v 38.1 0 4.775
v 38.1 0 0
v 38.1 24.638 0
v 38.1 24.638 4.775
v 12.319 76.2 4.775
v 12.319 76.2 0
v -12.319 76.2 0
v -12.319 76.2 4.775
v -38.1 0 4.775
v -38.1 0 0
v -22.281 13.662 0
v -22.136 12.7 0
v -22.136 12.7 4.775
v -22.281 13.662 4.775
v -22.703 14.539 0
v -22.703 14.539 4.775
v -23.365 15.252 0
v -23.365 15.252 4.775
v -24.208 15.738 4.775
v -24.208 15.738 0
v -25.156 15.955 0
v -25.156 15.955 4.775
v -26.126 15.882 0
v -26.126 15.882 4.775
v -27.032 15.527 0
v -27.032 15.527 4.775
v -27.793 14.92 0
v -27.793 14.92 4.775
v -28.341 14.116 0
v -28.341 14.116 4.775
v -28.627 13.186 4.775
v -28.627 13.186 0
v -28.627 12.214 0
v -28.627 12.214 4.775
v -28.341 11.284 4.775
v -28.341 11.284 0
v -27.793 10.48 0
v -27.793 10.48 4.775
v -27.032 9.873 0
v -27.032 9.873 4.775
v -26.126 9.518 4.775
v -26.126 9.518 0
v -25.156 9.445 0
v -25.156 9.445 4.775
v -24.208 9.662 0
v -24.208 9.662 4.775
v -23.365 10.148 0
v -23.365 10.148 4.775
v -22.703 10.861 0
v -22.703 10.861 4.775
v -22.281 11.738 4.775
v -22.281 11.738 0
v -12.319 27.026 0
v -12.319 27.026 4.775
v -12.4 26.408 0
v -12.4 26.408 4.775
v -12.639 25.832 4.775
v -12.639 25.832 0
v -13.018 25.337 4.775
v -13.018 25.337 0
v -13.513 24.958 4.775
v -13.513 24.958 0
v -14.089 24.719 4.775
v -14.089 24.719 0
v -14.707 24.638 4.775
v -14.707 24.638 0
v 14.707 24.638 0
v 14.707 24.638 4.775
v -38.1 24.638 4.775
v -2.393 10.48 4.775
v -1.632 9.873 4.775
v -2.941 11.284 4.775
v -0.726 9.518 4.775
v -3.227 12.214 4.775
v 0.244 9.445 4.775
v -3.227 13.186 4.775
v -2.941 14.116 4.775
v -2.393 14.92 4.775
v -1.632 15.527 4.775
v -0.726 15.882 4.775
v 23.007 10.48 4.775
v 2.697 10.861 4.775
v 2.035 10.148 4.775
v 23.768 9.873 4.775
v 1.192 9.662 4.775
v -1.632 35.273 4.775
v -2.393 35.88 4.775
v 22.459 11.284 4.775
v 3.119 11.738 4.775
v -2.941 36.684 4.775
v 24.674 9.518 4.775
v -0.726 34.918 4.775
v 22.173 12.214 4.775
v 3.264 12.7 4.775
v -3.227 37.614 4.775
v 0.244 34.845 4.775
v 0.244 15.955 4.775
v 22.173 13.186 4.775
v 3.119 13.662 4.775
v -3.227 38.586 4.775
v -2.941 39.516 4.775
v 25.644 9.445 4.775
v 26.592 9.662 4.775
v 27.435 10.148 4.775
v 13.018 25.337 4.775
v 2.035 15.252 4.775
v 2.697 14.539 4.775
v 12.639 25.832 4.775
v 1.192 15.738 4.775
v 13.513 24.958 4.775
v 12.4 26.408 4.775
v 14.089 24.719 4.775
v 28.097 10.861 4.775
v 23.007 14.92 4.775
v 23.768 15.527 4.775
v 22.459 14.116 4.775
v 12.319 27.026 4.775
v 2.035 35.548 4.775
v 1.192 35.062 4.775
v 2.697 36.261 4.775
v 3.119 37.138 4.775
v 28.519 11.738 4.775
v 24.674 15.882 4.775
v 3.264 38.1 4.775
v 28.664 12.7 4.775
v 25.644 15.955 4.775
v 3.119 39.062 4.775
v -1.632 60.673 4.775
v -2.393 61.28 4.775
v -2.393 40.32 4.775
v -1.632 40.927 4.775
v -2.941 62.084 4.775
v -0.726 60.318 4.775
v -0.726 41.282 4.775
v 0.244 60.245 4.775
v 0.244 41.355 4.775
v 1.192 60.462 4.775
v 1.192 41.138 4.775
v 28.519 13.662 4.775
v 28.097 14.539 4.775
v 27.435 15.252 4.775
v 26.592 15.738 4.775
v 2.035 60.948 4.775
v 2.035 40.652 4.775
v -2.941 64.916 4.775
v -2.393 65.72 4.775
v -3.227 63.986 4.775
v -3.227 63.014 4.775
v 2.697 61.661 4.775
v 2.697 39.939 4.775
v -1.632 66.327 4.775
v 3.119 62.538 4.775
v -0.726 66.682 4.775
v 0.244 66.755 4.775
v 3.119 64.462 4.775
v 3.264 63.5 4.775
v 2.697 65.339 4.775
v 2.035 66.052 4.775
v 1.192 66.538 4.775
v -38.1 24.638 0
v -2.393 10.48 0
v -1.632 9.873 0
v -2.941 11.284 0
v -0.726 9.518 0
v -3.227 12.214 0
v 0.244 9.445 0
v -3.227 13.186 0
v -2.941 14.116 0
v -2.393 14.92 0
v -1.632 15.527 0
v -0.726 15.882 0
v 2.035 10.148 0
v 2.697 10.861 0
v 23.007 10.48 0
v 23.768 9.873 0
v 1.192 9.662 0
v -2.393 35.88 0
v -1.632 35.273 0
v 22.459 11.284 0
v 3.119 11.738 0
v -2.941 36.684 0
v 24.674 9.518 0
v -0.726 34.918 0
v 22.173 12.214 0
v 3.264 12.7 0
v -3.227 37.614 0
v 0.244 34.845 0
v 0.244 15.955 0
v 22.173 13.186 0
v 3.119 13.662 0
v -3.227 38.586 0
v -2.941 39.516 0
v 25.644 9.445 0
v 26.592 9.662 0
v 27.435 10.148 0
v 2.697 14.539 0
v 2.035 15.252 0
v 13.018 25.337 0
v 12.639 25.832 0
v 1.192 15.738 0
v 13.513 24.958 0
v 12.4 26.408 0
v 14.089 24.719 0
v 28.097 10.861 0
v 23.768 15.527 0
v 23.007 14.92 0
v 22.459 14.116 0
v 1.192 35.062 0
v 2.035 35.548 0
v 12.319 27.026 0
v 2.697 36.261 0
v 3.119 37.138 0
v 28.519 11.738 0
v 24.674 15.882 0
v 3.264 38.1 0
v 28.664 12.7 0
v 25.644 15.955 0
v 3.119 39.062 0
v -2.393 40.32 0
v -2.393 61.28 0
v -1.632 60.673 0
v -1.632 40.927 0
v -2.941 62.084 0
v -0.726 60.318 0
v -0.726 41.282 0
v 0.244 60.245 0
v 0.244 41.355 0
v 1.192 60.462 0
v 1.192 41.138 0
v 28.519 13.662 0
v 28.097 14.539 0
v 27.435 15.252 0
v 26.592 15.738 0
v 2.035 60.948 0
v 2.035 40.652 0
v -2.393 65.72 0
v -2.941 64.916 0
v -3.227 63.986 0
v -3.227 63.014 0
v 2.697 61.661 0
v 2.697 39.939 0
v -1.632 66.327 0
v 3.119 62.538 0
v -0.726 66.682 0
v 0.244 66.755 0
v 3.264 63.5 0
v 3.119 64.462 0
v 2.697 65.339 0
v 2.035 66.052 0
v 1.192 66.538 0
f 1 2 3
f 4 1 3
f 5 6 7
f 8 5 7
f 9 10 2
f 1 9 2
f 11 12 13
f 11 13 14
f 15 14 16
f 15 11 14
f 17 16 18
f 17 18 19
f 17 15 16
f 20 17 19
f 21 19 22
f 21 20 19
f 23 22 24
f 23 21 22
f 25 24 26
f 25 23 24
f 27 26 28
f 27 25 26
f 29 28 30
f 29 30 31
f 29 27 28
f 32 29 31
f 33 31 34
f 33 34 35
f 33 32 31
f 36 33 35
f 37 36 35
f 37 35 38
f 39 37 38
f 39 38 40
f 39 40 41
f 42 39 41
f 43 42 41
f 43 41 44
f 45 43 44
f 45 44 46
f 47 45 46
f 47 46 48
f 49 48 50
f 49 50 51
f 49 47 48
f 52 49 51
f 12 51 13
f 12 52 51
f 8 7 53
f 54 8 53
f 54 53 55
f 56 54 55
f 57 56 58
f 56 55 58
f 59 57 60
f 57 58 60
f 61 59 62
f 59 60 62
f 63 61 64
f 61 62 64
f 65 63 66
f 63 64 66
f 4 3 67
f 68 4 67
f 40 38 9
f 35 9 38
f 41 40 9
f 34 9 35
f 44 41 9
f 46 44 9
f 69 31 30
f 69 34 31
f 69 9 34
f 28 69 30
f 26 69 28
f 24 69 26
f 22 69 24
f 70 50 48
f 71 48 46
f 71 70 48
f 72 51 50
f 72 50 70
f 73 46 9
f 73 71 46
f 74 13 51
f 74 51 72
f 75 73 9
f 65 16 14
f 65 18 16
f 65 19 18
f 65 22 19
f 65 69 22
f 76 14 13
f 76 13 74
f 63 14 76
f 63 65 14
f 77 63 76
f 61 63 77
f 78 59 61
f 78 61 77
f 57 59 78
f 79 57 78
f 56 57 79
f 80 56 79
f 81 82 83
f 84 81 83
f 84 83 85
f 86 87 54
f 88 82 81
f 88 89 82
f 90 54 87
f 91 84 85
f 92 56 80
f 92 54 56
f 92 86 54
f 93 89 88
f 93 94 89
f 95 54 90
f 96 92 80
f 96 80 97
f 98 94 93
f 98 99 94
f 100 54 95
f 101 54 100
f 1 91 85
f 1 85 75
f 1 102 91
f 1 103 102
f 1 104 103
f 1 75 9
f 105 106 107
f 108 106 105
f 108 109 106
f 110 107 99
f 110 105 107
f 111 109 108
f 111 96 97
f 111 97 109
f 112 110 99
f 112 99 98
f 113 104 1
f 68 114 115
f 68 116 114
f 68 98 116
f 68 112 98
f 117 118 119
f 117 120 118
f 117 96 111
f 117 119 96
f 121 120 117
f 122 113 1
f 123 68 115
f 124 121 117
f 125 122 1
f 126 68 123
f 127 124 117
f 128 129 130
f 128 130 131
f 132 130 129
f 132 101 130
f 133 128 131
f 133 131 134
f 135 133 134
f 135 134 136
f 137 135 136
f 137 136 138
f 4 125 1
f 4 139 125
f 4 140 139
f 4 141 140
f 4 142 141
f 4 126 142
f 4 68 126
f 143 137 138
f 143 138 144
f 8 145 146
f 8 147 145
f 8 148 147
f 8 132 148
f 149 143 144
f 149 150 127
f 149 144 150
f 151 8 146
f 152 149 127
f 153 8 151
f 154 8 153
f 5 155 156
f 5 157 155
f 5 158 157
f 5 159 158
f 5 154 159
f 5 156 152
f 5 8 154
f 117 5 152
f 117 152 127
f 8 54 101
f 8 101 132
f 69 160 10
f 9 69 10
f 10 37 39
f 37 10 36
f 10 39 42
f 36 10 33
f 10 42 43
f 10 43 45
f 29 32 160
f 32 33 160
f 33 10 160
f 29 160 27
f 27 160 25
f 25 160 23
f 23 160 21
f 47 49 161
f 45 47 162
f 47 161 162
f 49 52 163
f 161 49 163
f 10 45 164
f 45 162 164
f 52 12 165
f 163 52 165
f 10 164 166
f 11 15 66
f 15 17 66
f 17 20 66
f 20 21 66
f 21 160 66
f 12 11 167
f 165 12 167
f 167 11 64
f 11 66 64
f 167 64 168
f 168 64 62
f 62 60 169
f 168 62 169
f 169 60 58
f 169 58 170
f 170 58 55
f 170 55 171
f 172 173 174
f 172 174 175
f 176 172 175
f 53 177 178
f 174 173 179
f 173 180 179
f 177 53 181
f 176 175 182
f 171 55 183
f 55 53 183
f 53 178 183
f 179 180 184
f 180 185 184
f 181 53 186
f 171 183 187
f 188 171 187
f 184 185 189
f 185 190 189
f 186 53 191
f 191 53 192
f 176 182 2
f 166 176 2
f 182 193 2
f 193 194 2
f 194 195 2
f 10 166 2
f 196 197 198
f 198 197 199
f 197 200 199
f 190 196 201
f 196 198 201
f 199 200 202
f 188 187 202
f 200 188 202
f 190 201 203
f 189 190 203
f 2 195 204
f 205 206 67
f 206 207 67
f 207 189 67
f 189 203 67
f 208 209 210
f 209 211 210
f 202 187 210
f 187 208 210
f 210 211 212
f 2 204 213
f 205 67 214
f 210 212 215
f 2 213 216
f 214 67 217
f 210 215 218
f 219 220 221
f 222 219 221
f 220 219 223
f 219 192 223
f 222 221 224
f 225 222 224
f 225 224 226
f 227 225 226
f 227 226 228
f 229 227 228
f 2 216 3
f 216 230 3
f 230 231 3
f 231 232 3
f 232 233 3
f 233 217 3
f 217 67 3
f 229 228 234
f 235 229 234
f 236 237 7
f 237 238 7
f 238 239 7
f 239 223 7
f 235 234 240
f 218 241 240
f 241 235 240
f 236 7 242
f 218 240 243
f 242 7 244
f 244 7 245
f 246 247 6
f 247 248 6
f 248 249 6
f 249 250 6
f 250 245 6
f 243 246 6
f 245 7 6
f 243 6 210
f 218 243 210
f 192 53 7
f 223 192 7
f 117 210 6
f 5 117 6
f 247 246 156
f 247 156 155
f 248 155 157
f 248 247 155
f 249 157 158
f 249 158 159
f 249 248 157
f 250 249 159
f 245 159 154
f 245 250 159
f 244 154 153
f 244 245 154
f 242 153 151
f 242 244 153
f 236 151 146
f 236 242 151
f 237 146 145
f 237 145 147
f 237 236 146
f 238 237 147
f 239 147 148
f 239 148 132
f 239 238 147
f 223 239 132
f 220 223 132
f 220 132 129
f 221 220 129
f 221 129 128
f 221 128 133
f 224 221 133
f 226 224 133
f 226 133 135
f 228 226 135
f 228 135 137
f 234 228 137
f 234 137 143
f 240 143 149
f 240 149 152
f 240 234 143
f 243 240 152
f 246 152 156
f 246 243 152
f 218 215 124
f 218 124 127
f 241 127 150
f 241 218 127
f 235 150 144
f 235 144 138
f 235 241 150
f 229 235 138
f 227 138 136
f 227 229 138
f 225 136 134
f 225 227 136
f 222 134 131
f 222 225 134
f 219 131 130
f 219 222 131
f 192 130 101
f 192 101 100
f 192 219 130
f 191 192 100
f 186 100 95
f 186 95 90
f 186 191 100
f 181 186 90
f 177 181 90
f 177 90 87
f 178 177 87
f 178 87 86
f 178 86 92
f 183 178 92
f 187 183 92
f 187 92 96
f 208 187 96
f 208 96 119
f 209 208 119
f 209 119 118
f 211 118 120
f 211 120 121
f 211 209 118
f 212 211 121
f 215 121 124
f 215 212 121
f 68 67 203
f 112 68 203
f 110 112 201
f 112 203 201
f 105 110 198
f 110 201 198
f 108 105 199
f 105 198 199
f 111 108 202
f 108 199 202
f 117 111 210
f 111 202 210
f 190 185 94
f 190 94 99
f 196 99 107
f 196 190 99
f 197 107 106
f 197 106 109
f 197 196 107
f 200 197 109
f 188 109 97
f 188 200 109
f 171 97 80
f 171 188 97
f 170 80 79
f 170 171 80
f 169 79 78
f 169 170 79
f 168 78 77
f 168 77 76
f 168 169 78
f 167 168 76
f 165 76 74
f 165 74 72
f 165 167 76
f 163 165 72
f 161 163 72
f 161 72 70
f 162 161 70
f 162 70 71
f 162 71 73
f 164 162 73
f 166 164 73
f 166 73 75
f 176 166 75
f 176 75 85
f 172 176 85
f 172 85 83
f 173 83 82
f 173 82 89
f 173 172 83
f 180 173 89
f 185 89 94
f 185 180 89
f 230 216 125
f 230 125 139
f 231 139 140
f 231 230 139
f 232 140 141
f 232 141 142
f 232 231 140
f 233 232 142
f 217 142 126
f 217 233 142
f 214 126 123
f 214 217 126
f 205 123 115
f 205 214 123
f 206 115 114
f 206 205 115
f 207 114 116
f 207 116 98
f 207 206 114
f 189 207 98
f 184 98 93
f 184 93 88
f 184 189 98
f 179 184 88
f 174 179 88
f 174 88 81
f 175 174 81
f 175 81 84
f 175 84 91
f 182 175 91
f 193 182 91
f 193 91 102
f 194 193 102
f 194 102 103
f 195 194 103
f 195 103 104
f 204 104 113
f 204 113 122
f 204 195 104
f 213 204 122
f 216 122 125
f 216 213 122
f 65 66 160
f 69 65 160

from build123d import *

# Parameters (mm, degrees)
SKETCH1_R           = 3.2639
BOSS_EXTRUDE1_DEPTH = 4.7752


with BuildPart() as part:
    # Sketch1 → Boss-Extrude1 (new body)
    with BuildSketch(Plane.XY):
        with BuildLine():
            Line((-38.1, 0), (38.1, 0))
            Line((38.1, 0), (38.1, 24.638))
            Line((38.1, 24.638), (14.7066, 24.638))
            ThreePointArc((14.7066, 24.638), (13.018311849, 25.337311849), (12.319, 27.0256))
            Line((12.319, 27.0256), (12.319, 76.2))
            Line((12.319, 76.2), (-12.319, 76.2))
            Line((-12.319, 76.2), (-12.319, 27.0256))
            ThreePointArc((-12.319, 27.0256), (-13.018311849, 25.337311849), (-14.7066, 24.638))
            Line((-14.7066, 24.638), (-38.1, 24.638))
            Line((-38.1, 24.638), (-38.1, 0))
        make_face()
        with Locations((25.4, 12.7)):
            Circle(SKETCH1_R, mode=Mode.SUBTRACT)
        with Locations((0, 38.1)):
            Circle(SKETCH1_R, mode=Mode.SUBTRACT)
        with Locations((0, 63.5)):
            Circle(SKETCH1_R, mode=Mode.SUBTRACT)
        with Locations((0, 12.7)):
            Circle(SKETCH1_R, mode=Mode.SUBTRACT)
        with Locations((-25.4, 12.7)):
            Circle(SKETCH1_R, mode=Mode.SUBTRACT)
    extrude(amount=BOSS_EXTRUDE1_DEPTH)


solid = part.part
